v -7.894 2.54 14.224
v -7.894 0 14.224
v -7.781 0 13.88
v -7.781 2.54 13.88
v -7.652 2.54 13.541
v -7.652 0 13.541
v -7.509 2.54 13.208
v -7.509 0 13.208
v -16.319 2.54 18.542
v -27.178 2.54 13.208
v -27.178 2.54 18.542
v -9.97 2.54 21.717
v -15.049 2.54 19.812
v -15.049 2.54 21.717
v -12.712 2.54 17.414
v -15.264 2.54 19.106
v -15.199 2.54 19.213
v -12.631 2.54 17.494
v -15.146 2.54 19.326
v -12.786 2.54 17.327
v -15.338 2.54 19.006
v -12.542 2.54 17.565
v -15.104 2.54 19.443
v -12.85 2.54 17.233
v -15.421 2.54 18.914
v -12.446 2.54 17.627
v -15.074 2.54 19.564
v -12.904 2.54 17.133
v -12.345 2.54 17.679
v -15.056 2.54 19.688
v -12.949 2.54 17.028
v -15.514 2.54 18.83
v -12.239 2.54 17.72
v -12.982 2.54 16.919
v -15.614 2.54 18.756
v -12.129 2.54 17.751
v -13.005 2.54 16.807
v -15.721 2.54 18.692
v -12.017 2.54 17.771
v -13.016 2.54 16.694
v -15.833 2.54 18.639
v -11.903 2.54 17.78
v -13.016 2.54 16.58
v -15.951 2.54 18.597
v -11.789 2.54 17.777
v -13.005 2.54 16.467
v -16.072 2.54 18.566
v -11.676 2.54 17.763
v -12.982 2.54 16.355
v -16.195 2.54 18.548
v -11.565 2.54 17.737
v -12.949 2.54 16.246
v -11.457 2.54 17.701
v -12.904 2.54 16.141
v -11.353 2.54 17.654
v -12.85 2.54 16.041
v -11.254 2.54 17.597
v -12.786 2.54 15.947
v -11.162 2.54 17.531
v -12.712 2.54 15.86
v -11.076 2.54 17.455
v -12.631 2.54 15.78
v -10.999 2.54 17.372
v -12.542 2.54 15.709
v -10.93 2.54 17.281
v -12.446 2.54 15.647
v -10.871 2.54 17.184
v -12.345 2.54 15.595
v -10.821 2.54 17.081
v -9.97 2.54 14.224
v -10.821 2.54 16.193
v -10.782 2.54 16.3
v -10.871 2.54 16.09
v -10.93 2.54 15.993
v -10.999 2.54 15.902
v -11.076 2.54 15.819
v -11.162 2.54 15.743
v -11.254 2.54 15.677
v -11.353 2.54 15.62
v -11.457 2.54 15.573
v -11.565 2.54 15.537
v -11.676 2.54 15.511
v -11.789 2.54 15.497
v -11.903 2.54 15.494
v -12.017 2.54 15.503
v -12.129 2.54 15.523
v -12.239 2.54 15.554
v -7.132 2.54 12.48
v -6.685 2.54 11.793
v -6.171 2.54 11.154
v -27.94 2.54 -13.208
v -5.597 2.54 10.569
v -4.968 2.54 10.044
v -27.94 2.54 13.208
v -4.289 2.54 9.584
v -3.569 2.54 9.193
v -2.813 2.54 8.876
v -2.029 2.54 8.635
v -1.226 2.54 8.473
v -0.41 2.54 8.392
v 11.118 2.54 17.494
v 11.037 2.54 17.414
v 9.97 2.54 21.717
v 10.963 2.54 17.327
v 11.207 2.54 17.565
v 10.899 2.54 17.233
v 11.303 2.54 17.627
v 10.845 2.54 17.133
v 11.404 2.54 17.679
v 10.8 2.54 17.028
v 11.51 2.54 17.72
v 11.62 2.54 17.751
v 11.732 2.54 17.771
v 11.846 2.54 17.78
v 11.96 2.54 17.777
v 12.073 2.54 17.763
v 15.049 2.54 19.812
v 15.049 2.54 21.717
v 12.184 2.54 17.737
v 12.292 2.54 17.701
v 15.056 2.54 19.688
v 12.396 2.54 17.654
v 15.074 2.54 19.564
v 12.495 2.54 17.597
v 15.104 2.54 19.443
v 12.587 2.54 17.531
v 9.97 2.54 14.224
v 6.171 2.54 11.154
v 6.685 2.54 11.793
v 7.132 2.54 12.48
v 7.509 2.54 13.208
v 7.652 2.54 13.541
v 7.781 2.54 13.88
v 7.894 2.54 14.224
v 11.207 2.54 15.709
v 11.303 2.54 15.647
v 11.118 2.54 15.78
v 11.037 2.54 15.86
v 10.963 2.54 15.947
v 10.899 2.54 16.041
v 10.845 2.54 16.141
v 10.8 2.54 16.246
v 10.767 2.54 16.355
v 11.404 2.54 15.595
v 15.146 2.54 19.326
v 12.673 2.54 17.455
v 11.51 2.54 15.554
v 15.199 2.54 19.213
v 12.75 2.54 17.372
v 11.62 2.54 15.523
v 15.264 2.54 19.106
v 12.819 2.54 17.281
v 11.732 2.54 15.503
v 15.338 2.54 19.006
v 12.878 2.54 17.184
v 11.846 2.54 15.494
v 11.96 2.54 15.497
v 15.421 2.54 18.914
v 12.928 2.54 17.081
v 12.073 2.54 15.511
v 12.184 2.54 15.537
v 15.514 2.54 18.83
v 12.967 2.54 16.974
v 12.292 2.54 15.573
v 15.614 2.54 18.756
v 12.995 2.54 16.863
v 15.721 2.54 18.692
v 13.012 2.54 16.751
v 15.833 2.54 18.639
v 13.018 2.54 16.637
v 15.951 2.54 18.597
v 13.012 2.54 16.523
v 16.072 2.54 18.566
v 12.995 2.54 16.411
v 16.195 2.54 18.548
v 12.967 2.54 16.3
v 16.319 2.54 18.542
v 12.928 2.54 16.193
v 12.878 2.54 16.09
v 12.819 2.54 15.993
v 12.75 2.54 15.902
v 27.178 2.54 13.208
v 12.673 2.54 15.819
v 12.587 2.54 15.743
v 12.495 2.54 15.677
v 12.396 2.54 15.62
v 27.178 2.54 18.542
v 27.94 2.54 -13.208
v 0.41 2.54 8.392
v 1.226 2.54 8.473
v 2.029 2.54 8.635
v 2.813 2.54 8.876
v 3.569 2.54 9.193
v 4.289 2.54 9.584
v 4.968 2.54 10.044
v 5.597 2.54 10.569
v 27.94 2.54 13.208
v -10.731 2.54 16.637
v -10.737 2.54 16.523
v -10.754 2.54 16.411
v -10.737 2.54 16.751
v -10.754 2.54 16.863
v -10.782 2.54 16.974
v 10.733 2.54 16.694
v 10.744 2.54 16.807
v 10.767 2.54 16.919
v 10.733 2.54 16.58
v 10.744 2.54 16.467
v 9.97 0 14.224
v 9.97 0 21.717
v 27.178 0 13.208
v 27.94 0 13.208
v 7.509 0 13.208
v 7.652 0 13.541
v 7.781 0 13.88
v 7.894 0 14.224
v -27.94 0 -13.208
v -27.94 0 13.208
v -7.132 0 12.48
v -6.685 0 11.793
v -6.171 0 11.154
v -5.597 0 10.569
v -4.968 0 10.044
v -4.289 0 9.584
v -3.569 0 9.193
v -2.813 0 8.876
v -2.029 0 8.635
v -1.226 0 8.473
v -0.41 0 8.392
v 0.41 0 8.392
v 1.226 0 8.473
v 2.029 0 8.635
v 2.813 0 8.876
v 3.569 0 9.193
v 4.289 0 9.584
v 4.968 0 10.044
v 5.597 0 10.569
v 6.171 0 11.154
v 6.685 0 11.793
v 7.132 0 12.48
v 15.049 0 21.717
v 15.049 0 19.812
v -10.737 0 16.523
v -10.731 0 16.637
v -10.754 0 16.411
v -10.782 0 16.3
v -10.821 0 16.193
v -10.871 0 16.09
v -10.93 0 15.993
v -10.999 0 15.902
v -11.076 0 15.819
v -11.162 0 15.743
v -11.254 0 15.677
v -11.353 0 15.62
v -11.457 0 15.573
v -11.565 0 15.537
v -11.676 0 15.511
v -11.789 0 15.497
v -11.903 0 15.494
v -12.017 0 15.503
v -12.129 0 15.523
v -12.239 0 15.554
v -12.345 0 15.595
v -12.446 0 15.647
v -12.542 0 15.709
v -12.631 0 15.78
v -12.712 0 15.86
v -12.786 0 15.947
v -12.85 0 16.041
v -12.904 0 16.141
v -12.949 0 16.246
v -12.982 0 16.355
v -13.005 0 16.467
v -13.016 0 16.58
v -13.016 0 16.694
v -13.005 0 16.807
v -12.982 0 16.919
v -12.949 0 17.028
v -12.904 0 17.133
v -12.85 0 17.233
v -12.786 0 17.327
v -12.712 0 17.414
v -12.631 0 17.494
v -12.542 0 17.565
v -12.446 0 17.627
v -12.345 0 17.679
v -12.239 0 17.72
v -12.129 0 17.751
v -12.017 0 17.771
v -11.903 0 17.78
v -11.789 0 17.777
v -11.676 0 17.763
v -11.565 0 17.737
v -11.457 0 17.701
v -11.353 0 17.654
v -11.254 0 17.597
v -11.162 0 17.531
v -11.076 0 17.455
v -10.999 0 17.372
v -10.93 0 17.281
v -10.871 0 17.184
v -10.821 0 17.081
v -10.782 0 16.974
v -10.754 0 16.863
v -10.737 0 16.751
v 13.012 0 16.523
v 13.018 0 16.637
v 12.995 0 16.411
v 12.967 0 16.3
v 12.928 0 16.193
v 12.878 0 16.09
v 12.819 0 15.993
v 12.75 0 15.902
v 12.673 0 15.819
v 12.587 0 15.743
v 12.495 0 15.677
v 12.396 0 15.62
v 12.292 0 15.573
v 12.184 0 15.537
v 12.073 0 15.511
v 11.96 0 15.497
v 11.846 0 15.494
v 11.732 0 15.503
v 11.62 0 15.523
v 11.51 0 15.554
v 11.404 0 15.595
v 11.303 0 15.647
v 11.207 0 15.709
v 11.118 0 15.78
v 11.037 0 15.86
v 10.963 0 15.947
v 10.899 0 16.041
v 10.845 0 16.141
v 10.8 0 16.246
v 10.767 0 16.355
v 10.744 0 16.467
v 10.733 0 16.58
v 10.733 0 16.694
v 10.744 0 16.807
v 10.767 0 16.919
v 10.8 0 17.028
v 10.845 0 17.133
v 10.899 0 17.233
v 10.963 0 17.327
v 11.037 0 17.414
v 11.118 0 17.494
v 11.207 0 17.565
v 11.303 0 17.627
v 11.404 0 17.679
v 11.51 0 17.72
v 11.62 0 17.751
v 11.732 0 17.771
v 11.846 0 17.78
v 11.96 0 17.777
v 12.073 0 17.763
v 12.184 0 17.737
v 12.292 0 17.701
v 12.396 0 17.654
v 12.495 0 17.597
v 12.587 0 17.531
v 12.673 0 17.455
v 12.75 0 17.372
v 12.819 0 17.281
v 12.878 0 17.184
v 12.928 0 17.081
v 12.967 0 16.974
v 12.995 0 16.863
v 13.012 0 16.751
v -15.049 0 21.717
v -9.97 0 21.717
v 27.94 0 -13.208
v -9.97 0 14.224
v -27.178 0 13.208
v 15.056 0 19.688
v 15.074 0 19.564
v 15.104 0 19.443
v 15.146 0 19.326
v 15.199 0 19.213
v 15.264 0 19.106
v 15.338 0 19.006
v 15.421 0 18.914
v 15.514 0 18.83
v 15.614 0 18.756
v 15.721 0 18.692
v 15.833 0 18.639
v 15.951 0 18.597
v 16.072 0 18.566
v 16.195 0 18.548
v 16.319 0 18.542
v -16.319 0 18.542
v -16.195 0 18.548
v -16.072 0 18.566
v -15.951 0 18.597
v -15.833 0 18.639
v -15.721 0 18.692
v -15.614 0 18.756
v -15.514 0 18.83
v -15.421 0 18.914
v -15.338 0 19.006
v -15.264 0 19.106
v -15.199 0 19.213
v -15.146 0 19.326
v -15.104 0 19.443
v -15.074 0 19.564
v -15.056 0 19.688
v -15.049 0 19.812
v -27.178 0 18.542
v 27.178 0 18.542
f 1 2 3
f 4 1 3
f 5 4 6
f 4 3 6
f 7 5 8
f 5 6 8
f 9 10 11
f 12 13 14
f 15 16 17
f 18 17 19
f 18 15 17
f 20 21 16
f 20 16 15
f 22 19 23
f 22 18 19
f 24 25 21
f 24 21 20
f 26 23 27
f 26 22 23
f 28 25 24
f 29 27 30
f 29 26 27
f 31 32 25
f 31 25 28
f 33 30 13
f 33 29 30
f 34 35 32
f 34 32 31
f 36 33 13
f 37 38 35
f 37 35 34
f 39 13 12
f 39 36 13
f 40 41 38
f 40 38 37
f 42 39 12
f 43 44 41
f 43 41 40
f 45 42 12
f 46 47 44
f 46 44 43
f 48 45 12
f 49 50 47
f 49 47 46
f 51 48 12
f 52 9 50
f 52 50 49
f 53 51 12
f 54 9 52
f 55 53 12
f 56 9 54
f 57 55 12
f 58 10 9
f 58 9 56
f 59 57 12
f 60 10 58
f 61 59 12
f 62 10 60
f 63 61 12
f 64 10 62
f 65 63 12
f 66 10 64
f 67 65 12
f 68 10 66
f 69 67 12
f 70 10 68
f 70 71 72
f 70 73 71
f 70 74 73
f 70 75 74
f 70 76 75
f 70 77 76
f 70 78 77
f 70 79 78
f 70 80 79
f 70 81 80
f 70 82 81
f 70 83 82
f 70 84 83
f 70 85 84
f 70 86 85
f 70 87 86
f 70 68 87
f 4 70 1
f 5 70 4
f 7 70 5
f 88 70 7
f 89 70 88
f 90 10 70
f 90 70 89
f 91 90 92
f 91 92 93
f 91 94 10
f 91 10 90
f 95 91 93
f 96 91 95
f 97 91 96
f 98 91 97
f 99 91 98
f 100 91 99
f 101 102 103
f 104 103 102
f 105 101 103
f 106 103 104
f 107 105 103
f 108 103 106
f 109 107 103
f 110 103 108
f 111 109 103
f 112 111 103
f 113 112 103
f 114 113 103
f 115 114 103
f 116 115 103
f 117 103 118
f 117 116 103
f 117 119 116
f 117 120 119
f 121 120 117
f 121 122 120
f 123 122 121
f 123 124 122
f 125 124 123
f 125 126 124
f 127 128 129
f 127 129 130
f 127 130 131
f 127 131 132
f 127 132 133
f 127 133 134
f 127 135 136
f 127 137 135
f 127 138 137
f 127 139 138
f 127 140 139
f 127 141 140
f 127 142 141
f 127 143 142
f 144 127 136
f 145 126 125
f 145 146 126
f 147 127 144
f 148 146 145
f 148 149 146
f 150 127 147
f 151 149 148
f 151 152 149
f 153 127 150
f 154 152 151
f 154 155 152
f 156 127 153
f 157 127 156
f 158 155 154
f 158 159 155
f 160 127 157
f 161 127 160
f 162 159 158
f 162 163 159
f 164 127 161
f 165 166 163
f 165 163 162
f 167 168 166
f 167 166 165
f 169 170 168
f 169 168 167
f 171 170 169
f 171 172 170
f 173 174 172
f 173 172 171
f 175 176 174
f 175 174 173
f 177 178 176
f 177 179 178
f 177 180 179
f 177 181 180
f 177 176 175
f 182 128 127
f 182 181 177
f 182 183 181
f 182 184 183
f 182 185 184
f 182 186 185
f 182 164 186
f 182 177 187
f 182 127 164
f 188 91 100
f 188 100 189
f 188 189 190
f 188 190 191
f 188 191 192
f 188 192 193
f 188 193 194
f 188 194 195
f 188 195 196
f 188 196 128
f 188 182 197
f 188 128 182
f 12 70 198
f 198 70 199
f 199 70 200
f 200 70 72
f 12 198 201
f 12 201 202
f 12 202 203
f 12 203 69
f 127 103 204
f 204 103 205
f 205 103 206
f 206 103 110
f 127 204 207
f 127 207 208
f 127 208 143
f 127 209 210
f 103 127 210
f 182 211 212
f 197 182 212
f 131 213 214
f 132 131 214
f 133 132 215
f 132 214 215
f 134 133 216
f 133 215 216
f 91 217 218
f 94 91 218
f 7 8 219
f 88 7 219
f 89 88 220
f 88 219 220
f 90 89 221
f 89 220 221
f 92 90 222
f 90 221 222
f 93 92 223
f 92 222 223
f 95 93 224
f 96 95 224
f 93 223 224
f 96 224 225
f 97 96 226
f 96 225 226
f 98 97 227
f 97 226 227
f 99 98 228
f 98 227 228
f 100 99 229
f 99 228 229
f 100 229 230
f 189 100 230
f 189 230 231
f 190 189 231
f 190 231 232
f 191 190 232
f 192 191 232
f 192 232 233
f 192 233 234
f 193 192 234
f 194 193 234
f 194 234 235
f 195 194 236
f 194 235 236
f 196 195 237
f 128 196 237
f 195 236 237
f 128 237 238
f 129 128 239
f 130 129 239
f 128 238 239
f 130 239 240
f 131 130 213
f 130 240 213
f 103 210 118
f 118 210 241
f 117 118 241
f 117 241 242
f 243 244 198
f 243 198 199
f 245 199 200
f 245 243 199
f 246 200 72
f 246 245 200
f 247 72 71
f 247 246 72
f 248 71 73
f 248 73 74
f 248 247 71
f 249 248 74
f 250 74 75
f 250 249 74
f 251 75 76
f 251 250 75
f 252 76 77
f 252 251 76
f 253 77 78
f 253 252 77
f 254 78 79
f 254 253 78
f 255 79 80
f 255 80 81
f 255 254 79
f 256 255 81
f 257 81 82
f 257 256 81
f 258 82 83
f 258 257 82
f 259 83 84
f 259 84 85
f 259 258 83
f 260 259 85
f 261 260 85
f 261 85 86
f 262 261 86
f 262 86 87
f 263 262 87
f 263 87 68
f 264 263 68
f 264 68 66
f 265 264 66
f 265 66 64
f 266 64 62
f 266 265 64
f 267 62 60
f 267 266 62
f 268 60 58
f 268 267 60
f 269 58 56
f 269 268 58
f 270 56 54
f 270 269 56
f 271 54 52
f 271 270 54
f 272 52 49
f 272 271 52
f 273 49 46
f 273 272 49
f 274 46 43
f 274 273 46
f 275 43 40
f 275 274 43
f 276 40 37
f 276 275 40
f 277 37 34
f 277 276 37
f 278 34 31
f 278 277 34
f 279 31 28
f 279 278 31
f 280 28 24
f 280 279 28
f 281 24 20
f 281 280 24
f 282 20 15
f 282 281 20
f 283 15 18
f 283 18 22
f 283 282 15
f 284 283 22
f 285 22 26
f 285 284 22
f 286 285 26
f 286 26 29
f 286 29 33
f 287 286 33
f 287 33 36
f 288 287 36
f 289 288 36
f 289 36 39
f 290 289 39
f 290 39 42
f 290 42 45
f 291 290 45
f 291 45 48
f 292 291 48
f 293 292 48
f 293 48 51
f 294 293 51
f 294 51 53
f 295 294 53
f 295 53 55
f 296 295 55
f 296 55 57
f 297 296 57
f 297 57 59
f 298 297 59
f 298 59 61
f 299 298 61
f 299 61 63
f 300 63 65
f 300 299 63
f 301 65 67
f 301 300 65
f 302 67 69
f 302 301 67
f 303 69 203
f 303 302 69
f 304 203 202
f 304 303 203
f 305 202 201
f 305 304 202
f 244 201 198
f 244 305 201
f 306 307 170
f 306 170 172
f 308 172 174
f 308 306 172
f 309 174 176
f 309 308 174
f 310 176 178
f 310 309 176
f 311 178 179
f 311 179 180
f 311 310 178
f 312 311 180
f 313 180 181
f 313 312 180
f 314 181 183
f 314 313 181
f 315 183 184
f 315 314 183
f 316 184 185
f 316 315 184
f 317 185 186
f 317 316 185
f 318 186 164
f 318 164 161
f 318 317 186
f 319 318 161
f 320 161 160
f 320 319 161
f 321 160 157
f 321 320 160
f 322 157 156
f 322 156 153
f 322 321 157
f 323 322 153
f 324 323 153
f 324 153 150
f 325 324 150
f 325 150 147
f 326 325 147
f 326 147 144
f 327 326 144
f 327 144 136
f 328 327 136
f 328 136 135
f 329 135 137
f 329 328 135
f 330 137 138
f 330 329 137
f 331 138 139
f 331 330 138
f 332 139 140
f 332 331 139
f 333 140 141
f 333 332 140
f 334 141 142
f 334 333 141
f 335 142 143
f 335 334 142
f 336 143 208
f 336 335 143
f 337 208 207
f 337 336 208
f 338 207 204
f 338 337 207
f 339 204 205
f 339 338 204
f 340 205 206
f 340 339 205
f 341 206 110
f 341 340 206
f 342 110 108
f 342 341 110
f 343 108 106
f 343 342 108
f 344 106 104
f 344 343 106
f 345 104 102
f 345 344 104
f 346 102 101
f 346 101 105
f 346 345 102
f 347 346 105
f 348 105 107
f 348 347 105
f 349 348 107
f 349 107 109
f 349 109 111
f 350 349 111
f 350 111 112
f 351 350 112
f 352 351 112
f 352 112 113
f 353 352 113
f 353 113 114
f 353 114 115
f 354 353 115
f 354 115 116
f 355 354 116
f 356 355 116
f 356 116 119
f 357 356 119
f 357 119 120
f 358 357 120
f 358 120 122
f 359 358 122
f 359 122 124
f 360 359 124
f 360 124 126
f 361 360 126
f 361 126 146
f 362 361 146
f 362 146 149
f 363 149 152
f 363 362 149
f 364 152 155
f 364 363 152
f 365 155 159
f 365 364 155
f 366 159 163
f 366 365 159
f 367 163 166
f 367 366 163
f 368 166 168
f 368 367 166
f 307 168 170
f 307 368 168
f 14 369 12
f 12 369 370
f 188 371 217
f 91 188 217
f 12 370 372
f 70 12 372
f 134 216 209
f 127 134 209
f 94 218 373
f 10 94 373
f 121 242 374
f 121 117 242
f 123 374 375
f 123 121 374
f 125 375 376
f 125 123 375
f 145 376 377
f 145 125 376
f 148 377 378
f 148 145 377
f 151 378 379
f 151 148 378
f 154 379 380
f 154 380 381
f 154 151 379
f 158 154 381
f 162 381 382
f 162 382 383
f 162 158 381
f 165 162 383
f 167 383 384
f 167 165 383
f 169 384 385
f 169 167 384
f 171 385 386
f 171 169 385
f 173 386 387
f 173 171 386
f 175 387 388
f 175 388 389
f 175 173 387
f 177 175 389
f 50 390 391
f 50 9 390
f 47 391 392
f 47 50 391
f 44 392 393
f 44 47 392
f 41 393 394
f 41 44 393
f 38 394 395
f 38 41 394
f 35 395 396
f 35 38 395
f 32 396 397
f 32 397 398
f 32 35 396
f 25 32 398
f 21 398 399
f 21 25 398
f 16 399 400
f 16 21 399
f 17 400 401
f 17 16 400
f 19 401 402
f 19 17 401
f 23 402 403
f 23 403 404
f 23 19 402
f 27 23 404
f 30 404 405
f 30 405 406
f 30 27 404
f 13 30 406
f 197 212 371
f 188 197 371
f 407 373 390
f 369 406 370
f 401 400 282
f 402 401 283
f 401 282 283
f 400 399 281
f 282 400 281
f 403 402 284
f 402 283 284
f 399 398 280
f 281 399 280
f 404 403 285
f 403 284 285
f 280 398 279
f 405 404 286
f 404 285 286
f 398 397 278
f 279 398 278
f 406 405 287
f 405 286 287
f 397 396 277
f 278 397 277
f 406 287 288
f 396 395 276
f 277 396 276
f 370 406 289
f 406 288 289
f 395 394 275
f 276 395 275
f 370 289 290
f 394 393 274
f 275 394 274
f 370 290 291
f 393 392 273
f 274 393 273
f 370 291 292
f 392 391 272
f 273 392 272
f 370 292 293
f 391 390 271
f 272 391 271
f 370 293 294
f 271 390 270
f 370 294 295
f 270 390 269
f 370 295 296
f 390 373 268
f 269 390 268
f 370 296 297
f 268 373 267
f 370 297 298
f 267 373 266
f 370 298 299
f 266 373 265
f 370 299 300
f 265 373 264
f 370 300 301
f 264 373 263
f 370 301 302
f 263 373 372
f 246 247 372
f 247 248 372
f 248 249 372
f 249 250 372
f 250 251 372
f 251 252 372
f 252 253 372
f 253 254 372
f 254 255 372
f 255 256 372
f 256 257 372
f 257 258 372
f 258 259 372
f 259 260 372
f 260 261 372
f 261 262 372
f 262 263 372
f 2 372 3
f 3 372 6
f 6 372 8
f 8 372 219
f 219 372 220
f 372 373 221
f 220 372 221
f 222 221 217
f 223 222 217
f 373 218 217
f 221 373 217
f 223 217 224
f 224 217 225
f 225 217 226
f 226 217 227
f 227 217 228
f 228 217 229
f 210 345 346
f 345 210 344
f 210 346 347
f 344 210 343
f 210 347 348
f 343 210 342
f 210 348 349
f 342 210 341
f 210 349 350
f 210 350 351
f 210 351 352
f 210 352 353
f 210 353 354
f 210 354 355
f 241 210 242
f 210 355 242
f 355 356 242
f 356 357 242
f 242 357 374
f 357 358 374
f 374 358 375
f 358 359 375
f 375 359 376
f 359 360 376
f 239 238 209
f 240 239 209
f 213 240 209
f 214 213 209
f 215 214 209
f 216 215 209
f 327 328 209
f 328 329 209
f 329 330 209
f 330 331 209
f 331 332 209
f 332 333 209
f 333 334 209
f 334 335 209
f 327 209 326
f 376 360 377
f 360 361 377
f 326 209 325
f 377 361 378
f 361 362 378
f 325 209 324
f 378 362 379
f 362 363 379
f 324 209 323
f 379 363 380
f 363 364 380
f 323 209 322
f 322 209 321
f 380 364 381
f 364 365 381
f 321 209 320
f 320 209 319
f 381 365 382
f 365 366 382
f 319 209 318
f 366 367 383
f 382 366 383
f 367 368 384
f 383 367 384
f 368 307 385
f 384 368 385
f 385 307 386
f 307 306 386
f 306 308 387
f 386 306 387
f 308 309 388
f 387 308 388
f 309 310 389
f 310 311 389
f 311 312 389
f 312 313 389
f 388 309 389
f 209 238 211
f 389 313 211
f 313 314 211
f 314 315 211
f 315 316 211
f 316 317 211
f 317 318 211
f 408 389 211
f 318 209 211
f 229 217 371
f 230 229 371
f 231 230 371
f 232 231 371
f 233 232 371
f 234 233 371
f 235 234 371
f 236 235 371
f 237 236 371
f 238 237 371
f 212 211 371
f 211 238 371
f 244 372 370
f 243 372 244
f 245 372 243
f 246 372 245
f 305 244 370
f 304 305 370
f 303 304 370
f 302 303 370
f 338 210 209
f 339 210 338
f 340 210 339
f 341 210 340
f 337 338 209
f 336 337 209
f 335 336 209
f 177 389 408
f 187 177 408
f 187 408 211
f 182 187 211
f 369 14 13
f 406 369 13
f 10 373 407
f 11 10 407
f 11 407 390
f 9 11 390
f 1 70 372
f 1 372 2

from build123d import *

# Parameters (mm, degrees)
SKETCH1_R           = 1.143
SKETCH1_W           = 5.08
SKETCH1_H           = 3.175
BOSS_EXTRUDE1_DEPTH = 2.54
FILLET1_R           = 1.27


with BuildPart() as part:
    # Sketch1 → Boss-Extrude1 (new body)
    with BuildSketch(Plane(origin=(0, 0, 0), x_dir=(1, 0, 0), z_dir=(0, 1, 0))):
        with BuildLine():
            Line((-27.94, 13.208), (-27.94, -13.208))
            Line((-27.94, -13.208), (-27.178, -13.208))
            Line((-27.178, -13.208), (-7.509126714, -13.208))
            ThreePointArc((-7.509126714, -13.208), (0, -8.382), (7.509126714, -13.208))
            Line((7.509126714, -13.208), (27.178, -13.208))
            Line((27.178, -13.208), (27.94, -13.208))
            Line((27.94, -13.208), (27.94, 13.208))
            Line((27.94, 13.208), (-27.94, 13.208))
        make_face()
        with BuildLine():
            Line((-7.509126714, -13.208), (-27.178, -13.208))
            Line((-27.178, -13.208), (-27.178, -18.542))
            Line((-27.178, -18.542), (-15.0495, -18.542))
            Line((-15.0495, -18.542), (-9.9695, -18.542))
            Line((-9.9695, -18.542), (-9.9695, -14.224))
            Line((-9.9695, -14.224), (-7.894457296, -14.224))
            ThreePointArc((-7.894457296, -14.224), (-7.718527326, -13.709652922), (-7.509126714, -13.208))
        make_face()
        with Locations((-11.8745, -16.637)):
            Circle(SKETCH1_R, mode=Mode.SUBTRACT)
        with BuildLine():
            Line((27.178, -13.208), (7.509126714, -13.208))
            ThreePointArc((7.509126714, -13.208), (7.718527326, -13.709652922), (7.894457296, -14.224))
            Line((7.894457296, -14.224), (9.9695, -14.224))
            Line((9.9695, -14.224), (9.9695, -18.542))
            Line((9.9695, -18.542), (15.0495, -18.542))
            Line((15.0495, -18.542), (27.178, -18.542))
            Line((27.178, -18.542), (27.178, -13.208))
        make_face()
        with Locations((11.8745, -16.637)):
            Circle(SKETCH1_R, mode=Mode.SUBTRACT)
        with Locations((-12.5095, -20.1295)):
            Rectangle(SKETCH1_W, SKETCH1_H)
        with Locations((12.5095, -20.1295)):
            Rectangle(SKETCH1_W, SKETCH1_H)
    extrude(amount=BOSS_EXTRUDE1_DEPTH)

    # Fillet1
    fillet1_edges = [part.edges().sort_by_distance(p)[0] for p in [
        (15.0495, 1.27, 18.542),
        (-15.0495, 1.27, 18.542),
    ]]
    fillet(fillet1_edges, radius=FILLET1_R)


solid = part.part
